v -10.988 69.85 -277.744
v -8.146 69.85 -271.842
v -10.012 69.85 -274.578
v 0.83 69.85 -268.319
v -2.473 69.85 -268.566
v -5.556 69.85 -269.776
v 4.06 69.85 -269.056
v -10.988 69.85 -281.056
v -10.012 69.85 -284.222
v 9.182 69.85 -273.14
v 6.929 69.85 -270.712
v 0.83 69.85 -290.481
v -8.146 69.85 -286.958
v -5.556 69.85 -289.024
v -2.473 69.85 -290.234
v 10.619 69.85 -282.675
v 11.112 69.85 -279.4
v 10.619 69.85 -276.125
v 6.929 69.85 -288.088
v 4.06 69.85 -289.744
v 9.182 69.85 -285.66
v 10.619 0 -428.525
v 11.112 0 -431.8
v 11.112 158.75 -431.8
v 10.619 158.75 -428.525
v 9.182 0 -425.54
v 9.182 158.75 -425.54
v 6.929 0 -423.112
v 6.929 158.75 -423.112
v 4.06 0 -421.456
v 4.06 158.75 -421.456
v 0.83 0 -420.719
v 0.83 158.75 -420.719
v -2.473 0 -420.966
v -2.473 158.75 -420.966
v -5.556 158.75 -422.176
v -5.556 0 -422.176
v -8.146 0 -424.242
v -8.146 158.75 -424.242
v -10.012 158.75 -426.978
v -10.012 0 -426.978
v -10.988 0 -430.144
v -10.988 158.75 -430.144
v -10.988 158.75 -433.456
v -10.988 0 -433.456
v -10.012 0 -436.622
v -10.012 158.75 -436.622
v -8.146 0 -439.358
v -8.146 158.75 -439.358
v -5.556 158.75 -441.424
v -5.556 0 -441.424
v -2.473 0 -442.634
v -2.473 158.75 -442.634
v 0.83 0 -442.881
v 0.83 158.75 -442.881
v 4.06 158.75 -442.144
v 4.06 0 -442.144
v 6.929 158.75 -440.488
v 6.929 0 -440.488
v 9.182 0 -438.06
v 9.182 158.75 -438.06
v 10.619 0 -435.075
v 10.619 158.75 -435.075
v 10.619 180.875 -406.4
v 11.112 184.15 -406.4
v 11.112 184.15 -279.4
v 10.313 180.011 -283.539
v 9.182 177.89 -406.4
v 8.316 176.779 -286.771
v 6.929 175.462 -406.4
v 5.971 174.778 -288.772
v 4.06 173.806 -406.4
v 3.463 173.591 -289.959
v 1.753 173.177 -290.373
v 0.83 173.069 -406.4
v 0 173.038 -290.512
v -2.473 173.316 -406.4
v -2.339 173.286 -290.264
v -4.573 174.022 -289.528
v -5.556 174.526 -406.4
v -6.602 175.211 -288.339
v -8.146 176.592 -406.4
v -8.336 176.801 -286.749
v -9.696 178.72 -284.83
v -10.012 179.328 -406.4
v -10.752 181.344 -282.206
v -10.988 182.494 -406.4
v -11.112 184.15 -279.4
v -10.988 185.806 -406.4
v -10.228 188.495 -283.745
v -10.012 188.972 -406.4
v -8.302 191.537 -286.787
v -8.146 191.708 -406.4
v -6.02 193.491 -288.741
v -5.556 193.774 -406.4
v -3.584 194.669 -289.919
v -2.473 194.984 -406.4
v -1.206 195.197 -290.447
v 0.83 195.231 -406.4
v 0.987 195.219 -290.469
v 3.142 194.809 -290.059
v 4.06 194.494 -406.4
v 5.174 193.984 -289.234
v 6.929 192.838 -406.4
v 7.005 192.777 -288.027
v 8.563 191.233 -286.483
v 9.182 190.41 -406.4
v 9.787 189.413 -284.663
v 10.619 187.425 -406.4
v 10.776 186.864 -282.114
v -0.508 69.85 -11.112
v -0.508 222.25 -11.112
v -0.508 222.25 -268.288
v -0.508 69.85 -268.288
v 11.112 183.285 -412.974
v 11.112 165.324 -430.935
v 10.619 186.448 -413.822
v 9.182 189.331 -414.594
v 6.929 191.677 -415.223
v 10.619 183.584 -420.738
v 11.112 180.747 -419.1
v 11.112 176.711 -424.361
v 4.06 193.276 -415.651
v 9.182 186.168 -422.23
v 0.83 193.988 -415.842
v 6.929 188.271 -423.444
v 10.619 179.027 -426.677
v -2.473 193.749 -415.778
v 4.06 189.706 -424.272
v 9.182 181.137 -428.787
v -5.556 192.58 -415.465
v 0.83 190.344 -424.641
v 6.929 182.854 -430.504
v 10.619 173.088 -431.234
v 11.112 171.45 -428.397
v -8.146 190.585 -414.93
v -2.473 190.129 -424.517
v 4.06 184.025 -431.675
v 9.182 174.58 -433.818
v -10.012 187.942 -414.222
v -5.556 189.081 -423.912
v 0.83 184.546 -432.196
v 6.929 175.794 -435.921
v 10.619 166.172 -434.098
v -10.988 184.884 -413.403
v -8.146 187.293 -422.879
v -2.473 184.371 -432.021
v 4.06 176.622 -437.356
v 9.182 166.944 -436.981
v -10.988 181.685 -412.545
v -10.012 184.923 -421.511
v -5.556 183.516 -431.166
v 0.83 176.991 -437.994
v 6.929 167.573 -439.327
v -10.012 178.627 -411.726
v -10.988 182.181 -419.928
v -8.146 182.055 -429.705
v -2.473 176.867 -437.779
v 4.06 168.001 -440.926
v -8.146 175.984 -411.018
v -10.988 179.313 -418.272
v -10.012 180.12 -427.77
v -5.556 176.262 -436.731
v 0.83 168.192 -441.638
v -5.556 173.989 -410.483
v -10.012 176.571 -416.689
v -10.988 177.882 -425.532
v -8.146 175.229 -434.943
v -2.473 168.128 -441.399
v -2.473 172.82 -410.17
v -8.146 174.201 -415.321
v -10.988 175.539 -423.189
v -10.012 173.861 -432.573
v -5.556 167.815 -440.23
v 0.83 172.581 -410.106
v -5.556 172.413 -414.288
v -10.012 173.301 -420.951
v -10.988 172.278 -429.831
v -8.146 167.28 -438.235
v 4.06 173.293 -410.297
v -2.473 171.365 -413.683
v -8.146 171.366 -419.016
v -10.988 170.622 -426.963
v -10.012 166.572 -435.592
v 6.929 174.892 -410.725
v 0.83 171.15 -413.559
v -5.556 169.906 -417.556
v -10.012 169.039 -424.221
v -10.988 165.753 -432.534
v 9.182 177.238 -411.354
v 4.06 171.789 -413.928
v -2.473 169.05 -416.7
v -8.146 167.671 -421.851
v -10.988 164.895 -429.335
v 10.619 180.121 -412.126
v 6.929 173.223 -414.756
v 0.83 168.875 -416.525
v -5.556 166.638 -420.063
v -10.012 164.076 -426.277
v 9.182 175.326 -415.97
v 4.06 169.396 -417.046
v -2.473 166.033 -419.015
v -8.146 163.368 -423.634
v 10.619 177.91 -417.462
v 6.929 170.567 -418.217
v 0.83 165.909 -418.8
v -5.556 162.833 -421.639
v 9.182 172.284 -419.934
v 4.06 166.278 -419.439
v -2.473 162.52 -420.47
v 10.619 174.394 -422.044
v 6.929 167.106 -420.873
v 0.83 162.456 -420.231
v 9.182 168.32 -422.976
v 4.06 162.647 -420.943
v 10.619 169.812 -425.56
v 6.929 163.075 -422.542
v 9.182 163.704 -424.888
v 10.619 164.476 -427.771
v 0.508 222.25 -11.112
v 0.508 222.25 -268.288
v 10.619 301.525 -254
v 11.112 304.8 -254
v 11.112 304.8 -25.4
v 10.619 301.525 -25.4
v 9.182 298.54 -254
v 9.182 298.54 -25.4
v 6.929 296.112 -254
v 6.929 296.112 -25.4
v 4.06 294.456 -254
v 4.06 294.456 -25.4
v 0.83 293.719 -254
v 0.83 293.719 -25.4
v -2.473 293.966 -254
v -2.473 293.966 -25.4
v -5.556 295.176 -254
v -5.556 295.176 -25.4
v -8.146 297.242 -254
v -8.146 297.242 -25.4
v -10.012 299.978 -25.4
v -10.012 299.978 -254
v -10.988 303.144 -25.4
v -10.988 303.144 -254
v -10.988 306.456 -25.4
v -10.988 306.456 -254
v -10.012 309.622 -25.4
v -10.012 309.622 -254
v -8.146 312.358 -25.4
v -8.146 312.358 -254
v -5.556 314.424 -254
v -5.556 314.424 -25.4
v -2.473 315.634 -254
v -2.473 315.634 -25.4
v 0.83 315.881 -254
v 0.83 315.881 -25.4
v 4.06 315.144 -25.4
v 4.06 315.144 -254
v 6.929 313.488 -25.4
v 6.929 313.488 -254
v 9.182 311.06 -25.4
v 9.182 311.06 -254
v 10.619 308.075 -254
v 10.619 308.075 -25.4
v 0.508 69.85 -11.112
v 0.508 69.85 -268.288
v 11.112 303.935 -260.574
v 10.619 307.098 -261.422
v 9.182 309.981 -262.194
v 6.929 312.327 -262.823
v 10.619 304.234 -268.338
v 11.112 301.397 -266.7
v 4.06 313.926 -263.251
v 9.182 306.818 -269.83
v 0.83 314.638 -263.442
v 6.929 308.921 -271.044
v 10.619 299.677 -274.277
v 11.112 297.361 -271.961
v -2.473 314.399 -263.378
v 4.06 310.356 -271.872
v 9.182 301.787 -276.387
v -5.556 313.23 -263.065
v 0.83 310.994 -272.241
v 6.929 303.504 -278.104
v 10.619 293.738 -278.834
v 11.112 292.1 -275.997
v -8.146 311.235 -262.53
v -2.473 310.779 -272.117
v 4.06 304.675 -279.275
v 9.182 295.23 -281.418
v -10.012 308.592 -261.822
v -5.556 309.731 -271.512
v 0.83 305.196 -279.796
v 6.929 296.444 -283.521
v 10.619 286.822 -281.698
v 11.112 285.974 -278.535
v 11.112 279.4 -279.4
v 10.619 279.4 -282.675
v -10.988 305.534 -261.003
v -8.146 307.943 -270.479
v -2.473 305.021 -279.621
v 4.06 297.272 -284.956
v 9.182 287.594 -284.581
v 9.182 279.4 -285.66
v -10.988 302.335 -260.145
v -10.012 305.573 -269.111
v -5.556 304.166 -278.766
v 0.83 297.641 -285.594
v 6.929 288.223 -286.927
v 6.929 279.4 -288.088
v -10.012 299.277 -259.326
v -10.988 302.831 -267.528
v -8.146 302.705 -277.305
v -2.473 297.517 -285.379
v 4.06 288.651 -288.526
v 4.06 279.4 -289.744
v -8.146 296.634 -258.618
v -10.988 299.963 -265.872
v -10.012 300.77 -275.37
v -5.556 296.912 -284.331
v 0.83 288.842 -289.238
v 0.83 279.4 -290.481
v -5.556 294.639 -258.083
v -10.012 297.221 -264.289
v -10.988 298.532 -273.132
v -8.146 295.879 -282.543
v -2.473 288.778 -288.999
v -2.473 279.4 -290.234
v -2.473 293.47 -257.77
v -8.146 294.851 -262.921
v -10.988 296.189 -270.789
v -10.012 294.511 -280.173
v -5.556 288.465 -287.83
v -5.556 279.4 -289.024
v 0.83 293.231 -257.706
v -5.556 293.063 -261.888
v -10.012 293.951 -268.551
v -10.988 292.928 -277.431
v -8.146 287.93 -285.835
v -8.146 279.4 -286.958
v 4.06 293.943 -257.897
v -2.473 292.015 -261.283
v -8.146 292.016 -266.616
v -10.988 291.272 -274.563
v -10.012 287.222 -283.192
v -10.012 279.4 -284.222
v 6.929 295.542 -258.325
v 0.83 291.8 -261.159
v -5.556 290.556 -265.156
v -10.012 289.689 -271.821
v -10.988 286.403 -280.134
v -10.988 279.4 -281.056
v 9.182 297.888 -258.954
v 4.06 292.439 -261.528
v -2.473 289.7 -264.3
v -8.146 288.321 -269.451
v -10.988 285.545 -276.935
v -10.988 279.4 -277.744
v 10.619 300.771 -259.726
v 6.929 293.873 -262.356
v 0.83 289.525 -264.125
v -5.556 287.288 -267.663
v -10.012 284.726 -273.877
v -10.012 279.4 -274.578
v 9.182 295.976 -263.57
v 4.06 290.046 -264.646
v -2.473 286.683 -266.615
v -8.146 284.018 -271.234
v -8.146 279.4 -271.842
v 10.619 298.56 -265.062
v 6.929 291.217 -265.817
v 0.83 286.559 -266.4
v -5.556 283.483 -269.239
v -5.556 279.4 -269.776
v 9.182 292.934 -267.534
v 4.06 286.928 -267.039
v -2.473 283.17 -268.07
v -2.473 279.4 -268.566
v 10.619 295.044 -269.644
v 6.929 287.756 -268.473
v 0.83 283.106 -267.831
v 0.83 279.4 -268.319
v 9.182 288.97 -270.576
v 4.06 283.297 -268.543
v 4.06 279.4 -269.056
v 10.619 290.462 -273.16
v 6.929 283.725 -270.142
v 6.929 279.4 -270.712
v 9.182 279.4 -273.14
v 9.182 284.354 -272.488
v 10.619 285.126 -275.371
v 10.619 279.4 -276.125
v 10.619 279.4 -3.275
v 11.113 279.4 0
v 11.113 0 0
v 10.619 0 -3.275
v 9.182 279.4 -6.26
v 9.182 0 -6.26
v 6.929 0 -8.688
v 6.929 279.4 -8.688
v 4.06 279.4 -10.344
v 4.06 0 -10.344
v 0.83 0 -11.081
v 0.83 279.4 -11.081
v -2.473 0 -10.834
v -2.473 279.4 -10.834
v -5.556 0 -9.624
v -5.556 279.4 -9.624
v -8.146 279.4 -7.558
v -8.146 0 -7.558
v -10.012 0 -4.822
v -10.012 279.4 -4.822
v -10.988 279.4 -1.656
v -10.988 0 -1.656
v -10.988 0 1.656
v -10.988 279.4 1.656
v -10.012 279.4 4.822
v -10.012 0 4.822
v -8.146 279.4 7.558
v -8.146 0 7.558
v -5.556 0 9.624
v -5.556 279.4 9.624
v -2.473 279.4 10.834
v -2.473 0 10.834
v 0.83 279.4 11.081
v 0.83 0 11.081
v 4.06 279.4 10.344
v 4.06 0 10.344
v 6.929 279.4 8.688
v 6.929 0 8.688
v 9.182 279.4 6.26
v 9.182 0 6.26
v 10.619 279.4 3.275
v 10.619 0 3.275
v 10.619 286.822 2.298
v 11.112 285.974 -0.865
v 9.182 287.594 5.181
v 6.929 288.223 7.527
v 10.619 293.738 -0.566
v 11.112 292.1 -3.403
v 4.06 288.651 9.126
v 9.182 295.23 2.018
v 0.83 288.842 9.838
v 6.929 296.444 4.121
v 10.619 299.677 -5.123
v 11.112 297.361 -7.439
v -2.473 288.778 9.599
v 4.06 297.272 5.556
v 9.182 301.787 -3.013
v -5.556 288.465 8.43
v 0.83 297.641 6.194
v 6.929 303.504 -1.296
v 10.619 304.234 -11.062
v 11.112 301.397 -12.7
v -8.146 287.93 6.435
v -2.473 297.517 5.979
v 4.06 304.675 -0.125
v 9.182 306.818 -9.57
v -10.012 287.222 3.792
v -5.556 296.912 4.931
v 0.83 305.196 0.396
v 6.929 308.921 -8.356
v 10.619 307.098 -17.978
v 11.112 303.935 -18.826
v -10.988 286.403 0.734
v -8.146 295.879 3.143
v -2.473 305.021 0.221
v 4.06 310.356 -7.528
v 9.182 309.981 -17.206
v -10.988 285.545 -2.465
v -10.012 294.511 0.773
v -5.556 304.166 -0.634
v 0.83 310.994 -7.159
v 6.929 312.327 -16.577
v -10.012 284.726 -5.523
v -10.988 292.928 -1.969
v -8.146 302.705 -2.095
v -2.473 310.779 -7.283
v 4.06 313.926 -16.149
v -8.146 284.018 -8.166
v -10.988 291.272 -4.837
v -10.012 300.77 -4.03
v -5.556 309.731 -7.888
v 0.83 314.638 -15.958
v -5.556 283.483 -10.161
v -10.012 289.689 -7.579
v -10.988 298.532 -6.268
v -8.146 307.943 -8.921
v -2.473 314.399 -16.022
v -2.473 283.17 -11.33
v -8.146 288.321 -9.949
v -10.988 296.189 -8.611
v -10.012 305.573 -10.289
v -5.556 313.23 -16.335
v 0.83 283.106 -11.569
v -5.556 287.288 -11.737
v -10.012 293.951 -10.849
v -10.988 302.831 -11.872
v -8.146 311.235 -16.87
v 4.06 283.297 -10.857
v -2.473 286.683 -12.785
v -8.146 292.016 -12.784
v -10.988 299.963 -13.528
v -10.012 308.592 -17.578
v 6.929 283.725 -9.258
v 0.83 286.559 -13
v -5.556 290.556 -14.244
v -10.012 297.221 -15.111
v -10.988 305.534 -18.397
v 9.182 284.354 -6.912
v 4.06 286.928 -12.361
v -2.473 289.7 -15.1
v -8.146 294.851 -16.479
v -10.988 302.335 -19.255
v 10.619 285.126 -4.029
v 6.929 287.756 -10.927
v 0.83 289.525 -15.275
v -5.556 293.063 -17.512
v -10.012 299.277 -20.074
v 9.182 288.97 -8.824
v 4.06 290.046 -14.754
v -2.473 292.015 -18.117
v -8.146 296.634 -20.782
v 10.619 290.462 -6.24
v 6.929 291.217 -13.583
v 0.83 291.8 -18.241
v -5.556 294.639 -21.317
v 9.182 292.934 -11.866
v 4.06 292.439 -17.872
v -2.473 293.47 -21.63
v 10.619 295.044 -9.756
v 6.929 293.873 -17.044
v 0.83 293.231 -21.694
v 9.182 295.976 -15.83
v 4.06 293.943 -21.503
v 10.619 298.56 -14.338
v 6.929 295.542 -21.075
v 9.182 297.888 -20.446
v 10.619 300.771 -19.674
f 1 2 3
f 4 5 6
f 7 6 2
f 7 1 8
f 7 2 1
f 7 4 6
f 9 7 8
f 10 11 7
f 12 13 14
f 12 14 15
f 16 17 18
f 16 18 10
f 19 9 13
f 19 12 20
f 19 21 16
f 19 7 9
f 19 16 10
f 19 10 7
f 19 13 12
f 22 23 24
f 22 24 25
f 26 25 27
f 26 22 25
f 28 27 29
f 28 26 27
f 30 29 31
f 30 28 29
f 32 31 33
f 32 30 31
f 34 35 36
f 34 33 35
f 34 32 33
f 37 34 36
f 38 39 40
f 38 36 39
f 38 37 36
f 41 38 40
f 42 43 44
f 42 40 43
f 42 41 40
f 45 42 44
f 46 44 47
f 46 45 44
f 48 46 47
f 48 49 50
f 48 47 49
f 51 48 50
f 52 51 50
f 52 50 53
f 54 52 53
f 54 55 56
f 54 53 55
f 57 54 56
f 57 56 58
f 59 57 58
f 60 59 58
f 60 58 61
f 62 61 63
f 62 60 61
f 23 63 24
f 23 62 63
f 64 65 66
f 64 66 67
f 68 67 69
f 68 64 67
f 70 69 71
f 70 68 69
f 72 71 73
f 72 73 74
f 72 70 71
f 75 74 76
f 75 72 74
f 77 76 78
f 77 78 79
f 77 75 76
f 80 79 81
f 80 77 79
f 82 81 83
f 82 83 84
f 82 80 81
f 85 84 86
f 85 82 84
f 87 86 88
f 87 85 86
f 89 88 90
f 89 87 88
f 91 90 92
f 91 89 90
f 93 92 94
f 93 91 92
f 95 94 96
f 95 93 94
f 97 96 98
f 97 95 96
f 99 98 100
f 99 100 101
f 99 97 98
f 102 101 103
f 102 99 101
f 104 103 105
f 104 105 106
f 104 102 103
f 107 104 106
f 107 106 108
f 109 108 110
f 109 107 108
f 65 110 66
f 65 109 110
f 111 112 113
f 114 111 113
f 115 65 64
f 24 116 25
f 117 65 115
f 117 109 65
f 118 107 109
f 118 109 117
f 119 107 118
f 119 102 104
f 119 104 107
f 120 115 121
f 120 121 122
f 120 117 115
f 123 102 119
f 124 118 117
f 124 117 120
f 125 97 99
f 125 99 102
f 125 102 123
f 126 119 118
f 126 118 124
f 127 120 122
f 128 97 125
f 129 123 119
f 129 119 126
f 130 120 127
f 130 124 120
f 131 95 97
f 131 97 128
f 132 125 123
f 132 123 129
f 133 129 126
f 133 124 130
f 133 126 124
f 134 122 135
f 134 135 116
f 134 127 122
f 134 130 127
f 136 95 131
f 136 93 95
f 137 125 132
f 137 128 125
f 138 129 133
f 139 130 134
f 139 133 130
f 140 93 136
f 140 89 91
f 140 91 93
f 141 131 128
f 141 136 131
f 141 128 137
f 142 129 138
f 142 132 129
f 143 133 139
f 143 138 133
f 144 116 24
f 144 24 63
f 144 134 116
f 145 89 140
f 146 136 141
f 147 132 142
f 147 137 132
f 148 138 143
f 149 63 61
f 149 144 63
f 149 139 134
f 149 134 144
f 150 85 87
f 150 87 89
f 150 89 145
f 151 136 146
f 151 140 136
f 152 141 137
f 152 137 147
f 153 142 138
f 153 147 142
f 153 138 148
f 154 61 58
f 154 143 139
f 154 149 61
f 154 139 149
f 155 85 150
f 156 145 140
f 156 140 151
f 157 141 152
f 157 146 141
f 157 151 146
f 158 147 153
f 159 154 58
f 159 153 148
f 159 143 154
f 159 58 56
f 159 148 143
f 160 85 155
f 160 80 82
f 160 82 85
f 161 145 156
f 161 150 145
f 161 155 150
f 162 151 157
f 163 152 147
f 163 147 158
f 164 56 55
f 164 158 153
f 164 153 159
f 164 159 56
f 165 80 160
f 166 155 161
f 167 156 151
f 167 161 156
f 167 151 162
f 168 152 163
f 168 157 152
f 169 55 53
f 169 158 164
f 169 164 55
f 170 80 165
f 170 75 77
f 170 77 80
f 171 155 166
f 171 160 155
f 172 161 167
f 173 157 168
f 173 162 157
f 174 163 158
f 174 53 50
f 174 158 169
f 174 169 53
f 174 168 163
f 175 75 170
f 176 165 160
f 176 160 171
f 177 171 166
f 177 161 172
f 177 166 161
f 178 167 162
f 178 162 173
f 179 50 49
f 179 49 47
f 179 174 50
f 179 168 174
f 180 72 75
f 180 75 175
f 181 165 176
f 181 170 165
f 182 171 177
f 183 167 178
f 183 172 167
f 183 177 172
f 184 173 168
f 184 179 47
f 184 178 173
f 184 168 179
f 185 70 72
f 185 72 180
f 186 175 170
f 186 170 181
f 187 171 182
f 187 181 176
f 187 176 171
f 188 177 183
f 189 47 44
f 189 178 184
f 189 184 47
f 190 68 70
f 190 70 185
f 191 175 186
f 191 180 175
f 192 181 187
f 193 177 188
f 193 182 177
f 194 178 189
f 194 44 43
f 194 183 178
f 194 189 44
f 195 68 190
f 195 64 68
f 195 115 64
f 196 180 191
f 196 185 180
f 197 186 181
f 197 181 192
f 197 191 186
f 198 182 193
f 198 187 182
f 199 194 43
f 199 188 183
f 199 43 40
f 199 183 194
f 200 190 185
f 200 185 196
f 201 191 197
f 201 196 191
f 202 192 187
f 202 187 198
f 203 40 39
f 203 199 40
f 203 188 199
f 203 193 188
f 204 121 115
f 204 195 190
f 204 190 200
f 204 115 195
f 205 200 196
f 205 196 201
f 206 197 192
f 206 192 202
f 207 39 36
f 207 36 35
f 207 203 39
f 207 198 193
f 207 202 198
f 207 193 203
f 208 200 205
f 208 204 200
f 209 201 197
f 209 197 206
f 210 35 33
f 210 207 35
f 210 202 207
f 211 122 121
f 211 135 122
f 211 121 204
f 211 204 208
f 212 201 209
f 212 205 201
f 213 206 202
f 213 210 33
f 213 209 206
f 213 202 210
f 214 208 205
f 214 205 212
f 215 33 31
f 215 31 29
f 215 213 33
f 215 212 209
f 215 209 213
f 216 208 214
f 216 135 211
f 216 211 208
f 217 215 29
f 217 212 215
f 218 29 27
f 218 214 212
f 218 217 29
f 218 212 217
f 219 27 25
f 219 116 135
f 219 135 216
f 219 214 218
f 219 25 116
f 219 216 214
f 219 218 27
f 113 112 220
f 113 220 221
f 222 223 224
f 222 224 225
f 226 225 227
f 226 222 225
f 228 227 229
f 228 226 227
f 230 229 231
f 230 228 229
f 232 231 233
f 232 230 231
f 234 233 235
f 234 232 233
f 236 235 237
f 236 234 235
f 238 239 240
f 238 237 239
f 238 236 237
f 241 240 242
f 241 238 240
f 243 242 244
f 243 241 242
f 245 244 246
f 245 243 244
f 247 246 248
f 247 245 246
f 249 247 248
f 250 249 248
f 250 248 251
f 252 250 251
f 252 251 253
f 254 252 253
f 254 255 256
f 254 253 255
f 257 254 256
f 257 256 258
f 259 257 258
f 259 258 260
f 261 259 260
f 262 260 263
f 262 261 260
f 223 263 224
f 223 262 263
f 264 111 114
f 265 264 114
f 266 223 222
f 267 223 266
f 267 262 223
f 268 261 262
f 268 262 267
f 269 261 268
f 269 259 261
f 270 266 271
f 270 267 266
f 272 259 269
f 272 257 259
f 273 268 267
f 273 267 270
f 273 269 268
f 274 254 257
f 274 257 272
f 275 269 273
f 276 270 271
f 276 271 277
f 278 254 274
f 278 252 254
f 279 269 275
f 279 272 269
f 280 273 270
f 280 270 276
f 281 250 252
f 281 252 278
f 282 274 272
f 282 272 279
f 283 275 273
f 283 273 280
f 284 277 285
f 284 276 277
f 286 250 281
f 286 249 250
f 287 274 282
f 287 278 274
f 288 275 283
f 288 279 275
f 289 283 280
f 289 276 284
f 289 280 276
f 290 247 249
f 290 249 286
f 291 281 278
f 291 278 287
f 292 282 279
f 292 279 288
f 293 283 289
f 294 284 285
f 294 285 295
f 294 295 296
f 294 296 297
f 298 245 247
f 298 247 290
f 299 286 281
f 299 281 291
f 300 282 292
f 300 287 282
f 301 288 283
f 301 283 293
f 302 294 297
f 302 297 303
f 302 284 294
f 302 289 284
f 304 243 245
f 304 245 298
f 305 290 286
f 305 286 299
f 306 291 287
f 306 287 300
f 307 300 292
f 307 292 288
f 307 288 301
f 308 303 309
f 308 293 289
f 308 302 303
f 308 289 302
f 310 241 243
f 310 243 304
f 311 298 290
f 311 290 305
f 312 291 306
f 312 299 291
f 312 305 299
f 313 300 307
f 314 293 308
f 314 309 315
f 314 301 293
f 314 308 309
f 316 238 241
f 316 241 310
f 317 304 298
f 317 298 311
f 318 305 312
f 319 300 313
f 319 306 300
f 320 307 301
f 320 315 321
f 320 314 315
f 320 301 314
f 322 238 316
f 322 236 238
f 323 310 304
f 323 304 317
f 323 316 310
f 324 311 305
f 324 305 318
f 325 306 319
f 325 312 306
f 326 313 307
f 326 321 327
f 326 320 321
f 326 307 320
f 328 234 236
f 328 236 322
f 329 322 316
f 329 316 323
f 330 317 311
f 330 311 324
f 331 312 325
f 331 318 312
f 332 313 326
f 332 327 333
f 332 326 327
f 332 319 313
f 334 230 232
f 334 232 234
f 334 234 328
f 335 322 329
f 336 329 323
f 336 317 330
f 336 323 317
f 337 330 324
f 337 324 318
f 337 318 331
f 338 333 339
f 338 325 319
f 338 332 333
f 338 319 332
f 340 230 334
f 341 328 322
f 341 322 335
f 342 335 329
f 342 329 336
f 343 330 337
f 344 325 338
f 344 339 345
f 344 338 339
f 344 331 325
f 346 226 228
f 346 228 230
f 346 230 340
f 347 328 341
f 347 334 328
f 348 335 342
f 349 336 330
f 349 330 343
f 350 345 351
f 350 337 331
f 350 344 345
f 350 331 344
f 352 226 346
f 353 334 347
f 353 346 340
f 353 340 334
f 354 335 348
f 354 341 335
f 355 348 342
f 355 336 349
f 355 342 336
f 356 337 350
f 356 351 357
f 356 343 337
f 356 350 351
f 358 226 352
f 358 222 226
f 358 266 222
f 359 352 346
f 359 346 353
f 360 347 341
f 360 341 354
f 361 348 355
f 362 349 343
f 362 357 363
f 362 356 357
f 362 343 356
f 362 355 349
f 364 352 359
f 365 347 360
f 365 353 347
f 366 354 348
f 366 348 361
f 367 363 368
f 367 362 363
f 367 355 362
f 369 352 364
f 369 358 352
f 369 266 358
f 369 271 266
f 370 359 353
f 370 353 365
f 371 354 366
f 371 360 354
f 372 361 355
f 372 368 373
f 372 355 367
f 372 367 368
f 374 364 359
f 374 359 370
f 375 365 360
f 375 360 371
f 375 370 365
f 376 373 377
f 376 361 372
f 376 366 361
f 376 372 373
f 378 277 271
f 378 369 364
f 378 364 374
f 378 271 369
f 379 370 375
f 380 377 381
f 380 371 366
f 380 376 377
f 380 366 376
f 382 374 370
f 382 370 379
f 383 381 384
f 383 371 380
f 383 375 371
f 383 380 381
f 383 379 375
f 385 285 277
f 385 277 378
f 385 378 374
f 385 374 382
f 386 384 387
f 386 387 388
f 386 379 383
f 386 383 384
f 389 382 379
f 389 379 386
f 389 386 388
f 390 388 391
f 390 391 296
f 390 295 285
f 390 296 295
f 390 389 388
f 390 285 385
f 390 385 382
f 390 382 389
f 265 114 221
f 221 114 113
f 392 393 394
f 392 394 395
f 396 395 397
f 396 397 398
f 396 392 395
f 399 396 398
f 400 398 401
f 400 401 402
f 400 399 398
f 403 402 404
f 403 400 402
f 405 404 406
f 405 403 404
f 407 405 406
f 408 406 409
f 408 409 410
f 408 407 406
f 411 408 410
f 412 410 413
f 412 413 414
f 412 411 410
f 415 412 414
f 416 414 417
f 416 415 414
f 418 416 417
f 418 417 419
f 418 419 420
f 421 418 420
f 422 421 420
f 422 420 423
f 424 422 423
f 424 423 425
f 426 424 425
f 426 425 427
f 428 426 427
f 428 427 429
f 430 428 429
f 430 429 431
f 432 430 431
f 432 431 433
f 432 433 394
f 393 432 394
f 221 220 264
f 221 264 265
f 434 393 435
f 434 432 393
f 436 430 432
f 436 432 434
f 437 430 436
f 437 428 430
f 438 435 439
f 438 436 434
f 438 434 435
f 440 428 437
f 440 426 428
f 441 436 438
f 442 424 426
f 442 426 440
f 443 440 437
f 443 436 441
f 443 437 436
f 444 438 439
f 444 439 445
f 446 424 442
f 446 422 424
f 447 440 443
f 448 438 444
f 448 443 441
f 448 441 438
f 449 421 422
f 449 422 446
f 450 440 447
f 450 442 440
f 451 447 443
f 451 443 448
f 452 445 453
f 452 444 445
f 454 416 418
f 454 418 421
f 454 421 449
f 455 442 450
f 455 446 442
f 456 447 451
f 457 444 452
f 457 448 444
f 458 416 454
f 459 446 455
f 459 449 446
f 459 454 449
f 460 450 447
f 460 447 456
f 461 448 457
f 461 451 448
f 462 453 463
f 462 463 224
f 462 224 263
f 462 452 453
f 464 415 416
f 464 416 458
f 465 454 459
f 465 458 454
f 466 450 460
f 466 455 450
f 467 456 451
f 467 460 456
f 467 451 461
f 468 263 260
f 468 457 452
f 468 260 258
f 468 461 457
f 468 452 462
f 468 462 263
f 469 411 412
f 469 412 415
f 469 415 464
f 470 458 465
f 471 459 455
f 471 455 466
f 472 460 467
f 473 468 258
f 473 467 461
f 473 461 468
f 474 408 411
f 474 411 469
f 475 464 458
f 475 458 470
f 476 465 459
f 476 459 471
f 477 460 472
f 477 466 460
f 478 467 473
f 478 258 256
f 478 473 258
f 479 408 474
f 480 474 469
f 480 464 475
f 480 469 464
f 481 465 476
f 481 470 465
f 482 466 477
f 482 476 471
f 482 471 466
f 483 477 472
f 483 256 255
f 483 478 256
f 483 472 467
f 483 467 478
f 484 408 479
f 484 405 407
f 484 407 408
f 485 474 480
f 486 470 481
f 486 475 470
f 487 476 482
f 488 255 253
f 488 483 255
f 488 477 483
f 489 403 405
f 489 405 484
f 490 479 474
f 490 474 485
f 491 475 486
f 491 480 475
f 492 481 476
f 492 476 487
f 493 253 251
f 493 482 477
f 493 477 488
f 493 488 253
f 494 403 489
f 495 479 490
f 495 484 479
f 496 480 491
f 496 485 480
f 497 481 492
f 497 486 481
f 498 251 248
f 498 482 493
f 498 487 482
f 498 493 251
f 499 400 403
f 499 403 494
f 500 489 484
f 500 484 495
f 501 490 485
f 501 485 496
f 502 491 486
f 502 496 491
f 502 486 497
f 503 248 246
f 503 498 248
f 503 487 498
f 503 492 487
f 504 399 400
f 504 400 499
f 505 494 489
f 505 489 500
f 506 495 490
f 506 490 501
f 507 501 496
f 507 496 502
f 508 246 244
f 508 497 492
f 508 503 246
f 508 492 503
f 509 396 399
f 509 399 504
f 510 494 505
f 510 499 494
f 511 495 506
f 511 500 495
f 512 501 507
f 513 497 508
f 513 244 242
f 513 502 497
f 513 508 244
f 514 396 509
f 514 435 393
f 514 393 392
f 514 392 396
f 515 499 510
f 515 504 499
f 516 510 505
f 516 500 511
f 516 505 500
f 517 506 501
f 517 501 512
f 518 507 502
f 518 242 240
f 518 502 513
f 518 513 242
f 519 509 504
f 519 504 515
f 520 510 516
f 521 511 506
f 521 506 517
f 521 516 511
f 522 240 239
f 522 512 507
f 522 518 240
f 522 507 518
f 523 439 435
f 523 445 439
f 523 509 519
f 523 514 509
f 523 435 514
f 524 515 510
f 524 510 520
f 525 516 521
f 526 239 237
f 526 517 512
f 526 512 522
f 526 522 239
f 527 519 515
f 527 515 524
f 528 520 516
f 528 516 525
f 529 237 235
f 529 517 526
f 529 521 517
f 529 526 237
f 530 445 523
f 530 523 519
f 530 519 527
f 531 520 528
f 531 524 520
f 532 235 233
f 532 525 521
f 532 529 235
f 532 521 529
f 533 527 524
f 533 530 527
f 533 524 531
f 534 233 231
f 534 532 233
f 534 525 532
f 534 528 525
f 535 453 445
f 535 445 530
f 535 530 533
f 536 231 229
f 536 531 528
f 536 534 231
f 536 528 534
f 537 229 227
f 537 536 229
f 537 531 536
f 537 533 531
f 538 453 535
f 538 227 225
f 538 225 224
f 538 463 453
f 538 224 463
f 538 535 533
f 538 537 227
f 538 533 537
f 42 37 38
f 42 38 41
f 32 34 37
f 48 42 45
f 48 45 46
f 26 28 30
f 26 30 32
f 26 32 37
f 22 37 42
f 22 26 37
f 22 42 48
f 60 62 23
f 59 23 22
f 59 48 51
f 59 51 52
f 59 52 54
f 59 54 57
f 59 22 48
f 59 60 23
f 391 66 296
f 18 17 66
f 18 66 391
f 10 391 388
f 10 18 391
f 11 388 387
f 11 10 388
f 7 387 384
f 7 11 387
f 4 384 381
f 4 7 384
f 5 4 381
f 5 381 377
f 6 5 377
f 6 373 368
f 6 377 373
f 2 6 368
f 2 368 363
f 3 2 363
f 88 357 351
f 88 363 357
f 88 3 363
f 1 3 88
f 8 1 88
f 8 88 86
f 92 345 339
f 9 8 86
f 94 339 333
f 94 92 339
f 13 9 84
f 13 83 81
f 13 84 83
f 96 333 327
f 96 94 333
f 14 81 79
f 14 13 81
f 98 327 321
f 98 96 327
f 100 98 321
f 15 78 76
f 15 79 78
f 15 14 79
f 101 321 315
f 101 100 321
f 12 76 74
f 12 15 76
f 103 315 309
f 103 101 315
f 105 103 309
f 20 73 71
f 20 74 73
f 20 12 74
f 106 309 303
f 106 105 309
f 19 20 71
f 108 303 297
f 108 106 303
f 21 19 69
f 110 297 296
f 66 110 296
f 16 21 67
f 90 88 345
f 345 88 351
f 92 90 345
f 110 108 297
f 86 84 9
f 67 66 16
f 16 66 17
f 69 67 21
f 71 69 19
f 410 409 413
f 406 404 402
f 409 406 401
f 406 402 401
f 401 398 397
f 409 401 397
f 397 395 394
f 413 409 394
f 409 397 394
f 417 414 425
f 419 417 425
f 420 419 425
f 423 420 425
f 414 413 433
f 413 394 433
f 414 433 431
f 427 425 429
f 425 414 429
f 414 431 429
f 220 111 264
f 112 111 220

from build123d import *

# Parameters (mm, degrees)
SKETCH2_R                = 11.1125
SKETCH2_5_R              = 11.1125
BOSS_EXTRUDE1_DEPTH      = 0.508
BOSS_EXTRUDE1_DEPTH_BACK = 0.508
SKETCH3_W                = 257.175
SKETCH3_H                = 152.4


with BuildPart() as part:
    # Sweep1: sweep along a path in Sketch1
    with BuildLine(Plane(origin=(0, 0, 0), x_dir=(0, 0, -1), z_dir=(1, 0, 0))) as sweep1_path:
        Line((0, 0), (0, 279.4))
        ThreePointArc((0, 279.4), (7.439487758, 297.360512242), (25.4, 304.8))
        Line((25.4, 304.8), (254, 304.8))
        ThreePointArc((254, 304.8), (271.960512242, 297.360512242), (279.4, 279.4))
        Line((279.4, 279.4), (279.4, 184.15))
        Line((279.4, 184.15), (406.4, 184.15))
        ThreePointArc((406.4, 184.15), (424.360512242, 176.710512242), (431.8, 158.75))
        Line((431.8, 158.75), (431.8, 0))
    # Sketch2 → Sweep1 (sweep)
    with BuildSketch(Plane(origin=(0, 0, 0), x_dir=(1, 0, 0), z_dir=(0, 1, 0))):
        Circle(SKETCH2_R)
    sweep(path=sweep1_path.line, transition=Transition.RIGHT)

    # Sweep5: sweep along a path in Sketch1<9>
    with BuildLine(Plane(origin=(0, 0, 0), x_dir=(0, 0, -1), z_dir=(1, 0, 0))) as sweep5_path:
        Line((0, 0), (0, 279.4))
        ThreePointArc((0, 279.4), (7.439487758, 297.360512242), (25.4, 304.8))
        Line((25.4, 304.8), (254, 304.8))
        ThreePointArc((254, 304.8), (271.960512242, 297.360512242), (279.4, 279.4))
        Line((279.4, 279.4), (279.4, 184.15))
        Line((279.4, 184.15), (279.4, 69.85))
    # Sketch2<5> → Sweep5 (sweep)
    with BuildSketch(Plane(origin=(0, 0, 0), x_dir=(1, 0, 0), z_dir=(0, 1, 0))):
        Circle(SKETCH2_5_R)
    sweep(path=sweep5_path.line)


with BuildPart() as body_2:
    # Sketch3 → Boss-Extrude1 (new, two sides: drawn at the far end of the back side and taken through both)
    with BuildSketch(Plane(origin=(0, 0, 0), x_dir=(0, 0, -1), z_dir=(1, 0, 0)).offset(-BOSS_EXTRUDE1_DEPTH_BACK)):
        with Locations((139.7, 146.05)):
            Rectangle(SKETCH3_W, SKETCH3_H)
    extrude(amount=BOSS_EXTRUDE1_DEPTH + BOSS_EXTRUDE1_DEPTH_BACK)


solid = Compound([part.part, body_2.part])
